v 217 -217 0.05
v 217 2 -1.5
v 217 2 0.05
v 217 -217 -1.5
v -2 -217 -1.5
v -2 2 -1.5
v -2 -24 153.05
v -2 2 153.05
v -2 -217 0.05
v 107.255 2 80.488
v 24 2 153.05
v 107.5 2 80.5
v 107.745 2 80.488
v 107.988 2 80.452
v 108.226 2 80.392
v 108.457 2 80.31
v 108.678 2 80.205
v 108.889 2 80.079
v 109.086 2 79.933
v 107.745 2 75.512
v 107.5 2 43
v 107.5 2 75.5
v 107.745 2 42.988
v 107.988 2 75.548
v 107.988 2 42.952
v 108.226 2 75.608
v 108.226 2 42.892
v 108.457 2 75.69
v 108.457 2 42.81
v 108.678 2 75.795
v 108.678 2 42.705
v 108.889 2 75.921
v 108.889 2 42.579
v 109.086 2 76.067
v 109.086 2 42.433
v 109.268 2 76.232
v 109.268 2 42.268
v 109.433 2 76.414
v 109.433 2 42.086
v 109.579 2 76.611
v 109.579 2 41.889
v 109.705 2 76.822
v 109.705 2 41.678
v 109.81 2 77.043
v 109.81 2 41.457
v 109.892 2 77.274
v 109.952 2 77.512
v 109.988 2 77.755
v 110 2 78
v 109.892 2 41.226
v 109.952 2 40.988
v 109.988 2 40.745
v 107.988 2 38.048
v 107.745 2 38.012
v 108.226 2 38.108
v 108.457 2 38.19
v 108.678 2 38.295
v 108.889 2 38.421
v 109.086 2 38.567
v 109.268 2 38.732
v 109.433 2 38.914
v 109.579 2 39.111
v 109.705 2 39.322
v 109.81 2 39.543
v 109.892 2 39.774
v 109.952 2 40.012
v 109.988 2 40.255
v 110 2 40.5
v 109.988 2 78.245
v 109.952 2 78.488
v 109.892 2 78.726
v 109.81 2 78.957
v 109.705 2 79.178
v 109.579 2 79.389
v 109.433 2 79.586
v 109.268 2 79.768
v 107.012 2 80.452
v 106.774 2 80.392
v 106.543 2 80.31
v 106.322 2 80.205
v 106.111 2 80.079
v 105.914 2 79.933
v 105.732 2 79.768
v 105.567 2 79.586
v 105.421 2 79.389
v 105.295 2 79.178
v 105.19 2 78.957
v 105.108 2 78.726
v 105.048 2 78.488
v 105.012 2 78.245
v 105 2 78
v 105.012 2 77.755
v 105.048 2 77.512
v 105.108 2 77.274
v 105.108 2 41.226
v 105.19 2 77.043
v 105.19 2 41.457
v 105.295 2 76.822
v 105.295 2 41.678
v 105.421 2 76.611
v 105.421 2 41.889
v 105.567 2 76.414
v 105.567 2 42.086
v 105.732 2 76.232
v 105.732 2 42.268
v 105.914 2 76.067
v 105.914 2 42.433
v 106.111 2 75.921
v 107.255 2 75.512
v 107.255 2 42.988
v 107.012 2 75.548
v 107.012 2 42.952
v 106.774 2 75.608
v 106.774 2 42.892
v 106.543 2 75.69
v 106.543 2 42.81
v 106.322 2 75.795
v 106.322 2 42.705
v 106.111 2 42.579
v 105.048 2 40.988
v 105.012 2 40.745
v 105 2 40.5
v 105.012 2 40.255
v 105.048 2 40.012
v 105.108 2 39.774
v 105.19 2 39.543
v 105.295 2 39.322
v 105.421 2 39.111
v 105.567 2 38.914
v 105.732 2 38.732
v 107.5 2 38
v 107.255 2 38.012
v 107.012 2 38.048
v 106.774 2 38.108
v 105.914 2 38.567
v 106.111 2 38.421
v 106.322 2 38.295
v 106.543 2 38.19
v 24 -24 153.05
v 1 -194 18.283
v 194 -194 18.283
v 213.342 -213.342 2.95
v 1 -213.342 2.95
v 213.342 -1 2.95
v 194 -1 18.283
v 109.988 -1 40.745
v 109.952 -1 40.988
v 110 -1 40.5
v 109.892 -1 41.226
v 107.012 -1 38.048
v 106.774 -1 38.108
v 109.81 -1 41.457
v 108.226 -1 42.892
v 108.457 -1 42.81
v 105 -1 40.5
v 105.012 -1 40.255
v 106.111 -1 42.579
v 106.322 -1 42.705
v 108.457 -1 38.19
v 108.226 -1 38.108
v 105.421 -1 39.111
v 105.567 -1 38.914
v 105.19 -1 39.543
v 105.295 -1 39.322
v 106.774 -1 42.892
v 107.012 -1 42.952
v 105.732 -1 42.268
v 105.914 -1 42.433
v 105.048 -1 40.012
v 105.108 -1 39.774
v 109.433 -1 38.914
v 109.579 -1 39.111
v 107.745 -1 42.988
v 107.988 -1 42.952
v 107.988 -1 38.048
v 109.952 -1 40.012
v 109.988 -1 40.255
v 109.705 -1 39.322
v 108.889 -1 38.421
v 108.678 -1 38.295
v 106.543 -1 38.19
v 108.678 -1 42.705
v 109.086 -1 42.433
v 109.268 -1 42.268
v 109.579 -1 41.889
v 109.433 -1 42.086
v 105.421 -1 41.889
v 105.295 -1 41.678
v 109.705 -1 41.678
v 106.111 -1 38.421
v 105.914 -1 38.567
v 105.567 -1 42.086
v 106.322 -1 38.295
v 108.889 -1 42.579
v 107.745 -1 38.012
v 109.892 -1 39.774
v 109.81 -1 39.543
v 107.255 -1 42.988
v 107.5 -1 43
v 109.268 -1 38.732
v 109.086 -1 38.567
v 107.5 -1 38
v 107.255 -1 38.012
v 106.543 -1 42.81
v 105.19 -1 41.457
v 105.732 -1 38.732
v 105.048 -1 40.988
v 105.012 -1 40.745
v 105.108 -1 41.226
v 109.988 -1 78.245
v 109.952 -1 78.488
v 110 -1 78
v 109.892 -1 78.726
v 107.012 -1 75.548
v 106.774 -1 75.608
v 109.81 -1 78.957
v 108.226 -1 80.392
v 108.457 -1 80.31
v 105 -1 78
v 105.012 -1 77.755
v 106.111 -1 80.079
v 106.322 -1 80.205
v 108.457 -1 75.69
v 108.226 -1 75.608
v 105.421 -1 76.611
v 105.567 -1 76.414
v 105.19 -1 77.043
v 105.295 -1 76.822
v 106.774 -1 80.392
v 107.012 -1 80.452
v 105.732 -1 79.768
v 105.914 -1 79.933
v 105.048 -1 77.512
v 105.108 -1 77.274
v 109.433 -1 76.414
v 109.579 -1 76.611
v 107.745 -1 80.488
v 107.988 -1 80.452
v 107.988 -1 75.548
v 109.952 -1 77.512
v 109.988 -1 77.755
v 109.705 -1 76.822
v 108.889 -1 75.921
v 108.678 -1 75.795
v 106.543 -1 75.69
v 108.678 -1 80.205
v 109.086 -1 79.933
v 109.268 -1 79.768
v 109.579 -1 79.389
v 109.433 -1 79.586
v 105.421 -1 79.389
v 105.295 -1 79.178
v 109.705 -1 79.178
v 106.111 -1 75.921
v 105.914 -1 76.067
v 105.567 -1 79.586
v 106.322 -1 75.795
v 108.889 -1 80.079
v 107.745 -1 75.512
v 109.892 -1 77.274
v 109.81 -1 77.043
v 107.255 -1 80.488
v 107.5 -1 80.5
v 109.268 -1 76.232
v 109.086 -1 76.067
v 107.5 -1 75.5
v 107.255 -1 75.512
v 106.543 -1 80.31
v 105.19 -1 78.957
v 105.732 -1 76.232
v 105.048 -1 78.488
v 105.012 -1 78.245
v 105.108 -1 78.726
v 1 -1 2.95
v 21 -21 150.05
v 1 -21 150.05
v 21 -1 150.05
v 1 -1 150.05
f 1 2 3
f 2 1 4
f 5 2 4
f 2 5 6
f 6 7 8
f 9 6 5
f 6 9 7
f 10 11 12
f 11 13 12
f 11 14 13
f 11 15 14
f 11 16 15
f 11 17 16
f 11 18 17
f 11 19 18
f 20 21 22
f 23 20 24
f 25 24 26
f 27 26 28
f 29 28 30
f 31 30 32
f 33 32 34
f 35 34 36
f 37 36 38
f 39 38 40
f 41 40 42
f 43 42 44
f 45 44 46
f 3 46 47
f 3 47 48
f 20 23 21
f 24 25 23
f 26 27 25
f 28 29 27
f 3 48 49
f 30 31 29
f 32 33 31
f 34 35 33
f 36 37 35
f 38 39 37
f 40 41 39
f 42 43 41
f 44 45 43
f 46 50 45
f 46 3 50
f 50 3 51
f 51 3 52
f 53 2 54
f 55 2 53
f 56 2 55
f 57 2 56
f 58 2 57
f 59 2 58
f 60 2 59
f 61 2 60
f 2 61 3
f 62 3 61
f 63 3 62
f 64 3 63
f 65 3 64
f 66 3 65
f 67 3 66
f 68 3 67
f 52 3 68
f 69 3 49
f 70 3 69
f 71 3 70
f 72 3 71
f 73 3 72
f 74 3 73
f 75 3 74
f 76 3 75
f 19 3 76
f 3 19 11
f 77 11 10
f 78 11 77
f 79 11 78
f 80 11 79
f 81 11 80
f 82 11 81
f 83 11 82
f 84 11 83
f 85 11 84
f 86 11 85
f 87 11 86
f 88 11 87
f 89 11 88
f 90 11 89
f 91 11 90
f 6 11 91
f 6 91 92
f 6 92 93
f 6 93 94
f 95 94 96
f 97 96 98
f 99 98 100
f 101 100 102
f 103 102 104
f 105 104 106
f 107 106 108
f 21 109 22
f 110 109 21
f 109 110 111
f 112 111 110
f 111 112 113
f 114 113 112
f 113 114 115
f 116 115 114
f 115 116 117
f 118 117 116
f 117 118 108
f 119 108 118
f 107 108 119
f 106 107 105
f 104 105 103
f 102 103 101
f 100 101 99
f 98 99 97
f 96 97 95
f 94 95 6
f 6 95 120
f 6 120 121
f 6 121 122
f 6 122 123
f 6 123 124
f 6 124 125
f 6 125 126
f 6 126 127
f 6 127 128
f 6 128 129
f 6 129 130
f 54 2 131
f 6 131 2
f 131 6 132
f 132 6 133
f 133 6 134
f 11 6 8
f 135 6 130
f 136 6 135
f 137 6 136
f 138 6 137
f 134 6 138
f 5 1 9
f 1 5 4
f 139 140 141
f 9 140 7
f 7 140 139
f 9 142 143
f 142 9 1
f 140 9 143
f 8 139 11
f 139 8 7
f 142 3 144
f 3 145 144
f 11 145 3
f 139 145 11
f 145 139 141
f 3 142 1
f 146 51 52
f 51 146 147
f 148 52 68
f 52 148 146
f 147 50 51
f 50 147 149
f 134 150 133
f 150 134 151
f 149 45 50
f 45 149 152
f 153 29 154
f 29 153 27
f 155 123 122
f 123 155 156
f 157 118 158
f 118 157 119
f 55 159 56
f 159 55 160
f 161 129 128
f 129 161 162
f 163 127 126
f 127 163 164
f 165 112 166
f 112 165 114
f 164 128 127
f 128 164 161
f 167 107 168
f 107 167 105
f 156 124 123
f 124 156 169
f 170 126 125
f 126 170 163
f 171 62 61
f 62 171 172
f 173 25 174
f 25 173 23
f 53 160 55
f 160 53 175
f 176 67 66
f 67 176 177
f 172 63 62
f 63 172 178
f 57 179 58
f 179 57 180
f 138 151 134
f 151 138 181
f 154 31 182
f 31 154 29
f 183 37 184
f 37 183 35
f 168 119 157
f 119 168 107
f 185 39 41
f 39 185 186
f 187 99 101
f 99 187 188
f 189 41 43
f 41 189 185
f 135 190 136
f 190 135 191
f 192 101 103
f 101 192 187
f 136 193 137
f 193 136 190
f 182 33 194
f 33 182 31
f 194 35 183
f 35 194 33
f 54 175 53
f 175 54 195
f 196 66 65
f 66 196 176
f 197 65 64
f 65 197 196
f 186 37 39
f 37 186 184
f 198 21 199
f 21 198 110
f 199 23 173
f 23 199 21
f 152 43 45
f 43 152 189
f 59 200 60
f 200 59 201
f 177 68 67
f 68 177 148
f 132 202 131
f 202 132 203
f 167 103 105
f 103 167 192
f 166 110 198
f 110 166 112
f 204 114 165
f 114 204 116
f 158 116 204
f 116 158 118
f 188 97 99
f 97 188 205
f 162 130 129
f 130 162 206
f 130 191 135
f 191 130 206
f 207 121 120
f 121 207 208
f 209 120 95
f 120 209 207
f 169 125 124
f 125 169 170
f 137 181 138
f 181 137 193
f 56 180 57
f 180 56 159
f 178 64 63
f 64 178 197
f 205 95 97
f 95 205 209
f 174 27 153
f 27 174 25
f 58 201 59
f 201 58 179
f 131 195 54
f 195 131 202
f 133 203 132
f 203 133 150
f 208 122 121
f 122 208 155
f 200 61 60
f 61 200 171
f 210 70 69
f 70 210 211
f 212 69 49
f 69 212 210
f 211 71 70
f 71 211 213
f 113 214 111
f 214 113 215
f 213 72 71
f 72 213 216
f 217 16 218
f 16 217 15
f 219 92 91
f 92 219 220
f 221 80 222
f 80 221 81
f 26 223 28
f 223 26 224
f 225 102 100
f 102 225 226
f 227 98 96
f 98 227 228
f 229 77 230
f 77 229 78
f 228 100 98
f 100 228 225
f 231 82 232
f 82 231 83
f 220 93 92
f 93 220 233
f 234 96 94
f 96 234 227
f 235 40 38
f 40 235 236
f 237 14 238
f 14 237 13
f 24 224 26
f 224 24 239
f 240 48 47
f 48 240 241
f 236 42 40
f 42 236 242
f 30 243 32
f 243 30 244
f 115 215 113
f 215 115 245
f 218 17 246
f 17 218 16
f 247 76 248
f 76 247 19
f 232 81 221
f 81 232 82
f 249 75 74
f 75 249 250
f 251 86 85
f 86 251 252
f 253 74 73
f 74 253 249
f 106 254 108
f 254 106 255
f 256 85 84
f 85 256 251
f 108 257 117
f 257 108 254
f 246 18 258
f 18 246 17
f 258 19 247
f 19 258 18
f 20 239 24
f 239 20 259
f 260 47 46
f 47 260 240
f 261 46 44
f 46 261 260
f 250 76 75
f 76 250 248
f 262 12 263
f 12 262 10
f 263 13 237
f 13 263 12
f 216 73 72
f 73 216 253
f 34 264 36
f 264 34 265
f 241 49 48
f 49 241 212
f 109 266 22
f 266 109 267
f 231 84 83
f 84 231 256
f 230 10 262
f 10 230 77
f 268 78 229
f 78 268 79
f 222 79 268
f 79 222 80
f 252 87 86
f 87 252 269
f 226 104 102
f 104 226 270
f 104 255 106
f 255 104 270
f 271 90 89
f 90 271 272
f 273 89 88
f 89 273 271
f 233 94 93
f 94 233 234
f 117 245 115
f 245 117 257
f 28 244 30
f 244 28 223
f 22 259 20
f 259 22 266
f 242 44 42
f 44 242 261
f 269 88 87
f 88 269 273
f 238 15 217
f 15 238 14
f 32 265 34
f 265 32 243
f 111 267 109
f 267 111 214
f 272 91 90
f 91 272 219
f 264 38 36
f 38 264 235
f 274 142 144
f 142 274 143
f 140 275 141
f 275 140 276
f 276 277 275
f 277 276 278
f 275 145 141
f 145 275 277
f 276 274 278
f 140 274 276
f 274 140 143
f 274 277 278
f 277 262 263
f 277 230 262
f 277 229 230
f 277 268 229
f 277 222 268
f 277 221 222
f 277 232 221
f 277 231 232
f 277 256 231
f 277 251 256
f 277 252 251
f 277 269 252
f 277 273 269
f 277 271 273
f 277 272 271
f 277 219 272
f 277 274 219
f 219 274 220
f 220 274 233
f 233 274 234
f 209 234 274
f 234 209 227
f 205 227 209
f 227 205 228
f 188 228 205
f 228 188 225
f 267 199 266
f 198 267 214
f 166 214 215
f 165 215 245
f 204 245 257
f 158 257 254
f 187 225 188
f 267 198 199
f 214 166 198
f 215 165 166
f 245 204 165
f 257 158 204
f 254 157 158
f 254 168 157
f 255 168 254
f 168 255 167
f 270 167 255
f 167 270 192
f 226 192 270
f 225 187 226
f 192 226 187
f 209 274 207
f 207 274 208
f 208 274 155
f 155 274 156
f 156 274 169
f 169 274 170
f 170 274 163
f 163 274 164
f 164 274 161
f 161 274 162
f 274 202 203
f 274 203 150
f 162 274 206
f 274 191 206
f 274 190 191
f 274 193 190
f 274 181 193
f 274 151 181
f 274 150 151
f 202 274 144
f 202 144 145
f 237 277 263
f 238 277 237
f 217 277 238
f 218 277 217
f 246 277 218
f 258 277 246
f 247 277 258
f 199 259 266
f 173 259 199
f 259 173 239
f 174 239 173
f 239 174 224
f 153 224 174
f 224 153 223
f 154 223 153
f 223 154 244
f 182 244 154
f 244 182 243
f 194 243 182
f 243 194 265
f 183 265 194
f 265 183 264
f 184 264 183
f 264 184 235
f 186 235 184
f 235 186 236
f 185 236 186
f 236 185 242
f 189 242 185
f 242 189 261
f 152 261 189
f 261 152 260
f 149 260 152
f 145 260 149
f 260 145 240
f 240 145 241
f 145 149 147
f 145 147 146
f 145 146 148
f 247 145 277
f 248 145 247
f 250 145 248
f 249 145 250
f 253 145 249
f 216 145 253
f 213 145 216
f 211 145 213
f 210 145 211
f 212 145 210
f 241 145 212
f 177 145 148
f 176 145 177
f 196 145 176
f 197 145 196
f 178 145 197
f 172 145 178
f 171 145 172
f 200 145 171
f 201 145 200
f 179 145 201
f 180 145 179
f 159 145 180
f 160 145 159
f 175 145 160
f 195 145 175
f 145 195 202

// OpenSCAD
$fn = 64;
difference() {
	union() {
		difference() {
			translate(v = [107.5, -107.5, 0]) {
				cube(center = true, size = [219.0, 219.0, 3]);
			}
			translate(v = [107.5, -107.5, 1.5]) {
				cube(center = true, size = [219.0, 219.0, 3.1]);
			}
		}
		hull() {
			translate(v = [107.5, -107.5, 0]) {
				cube(center = true, size = [219.0, 219.0, 0.1]);
			}
			translate(v = [11.0, -11.0, 153]) {
				cube(center = true, size = [26.0, 26.0, 0.1]);
			}
		}
	}
	hull() {
		translate(v = [107.5, -107.5, 3]) {
			cube(center = true, size = [213.0, 213.0, 0.1]);
		}
		translate(v = [11.0, -11.0, 150]) {
			cube(center = true, size = [20.0, 20.0, 0.1]);
		}
	}
	union() {
		translate(v = [107.5, 0, 40.5]) {
			rotate(a = [90, 0, 0]) {
				cylinder(center = true, h = 30, r = 2.5);
			}
		}
		translate(v = [107.5, 0, 78.0]) {
			rotate(a = [90, 0, 0]) {
				cylinder(center = true, h = 30, r = 2.5);
			}
		}
		translate(v = [107.5, 0, 115.5]) {
			rotate(a = [90, 0, 0]) {
				cylinder(center = true, h = 30, r = 2.5);
			}
		}
	}
}
